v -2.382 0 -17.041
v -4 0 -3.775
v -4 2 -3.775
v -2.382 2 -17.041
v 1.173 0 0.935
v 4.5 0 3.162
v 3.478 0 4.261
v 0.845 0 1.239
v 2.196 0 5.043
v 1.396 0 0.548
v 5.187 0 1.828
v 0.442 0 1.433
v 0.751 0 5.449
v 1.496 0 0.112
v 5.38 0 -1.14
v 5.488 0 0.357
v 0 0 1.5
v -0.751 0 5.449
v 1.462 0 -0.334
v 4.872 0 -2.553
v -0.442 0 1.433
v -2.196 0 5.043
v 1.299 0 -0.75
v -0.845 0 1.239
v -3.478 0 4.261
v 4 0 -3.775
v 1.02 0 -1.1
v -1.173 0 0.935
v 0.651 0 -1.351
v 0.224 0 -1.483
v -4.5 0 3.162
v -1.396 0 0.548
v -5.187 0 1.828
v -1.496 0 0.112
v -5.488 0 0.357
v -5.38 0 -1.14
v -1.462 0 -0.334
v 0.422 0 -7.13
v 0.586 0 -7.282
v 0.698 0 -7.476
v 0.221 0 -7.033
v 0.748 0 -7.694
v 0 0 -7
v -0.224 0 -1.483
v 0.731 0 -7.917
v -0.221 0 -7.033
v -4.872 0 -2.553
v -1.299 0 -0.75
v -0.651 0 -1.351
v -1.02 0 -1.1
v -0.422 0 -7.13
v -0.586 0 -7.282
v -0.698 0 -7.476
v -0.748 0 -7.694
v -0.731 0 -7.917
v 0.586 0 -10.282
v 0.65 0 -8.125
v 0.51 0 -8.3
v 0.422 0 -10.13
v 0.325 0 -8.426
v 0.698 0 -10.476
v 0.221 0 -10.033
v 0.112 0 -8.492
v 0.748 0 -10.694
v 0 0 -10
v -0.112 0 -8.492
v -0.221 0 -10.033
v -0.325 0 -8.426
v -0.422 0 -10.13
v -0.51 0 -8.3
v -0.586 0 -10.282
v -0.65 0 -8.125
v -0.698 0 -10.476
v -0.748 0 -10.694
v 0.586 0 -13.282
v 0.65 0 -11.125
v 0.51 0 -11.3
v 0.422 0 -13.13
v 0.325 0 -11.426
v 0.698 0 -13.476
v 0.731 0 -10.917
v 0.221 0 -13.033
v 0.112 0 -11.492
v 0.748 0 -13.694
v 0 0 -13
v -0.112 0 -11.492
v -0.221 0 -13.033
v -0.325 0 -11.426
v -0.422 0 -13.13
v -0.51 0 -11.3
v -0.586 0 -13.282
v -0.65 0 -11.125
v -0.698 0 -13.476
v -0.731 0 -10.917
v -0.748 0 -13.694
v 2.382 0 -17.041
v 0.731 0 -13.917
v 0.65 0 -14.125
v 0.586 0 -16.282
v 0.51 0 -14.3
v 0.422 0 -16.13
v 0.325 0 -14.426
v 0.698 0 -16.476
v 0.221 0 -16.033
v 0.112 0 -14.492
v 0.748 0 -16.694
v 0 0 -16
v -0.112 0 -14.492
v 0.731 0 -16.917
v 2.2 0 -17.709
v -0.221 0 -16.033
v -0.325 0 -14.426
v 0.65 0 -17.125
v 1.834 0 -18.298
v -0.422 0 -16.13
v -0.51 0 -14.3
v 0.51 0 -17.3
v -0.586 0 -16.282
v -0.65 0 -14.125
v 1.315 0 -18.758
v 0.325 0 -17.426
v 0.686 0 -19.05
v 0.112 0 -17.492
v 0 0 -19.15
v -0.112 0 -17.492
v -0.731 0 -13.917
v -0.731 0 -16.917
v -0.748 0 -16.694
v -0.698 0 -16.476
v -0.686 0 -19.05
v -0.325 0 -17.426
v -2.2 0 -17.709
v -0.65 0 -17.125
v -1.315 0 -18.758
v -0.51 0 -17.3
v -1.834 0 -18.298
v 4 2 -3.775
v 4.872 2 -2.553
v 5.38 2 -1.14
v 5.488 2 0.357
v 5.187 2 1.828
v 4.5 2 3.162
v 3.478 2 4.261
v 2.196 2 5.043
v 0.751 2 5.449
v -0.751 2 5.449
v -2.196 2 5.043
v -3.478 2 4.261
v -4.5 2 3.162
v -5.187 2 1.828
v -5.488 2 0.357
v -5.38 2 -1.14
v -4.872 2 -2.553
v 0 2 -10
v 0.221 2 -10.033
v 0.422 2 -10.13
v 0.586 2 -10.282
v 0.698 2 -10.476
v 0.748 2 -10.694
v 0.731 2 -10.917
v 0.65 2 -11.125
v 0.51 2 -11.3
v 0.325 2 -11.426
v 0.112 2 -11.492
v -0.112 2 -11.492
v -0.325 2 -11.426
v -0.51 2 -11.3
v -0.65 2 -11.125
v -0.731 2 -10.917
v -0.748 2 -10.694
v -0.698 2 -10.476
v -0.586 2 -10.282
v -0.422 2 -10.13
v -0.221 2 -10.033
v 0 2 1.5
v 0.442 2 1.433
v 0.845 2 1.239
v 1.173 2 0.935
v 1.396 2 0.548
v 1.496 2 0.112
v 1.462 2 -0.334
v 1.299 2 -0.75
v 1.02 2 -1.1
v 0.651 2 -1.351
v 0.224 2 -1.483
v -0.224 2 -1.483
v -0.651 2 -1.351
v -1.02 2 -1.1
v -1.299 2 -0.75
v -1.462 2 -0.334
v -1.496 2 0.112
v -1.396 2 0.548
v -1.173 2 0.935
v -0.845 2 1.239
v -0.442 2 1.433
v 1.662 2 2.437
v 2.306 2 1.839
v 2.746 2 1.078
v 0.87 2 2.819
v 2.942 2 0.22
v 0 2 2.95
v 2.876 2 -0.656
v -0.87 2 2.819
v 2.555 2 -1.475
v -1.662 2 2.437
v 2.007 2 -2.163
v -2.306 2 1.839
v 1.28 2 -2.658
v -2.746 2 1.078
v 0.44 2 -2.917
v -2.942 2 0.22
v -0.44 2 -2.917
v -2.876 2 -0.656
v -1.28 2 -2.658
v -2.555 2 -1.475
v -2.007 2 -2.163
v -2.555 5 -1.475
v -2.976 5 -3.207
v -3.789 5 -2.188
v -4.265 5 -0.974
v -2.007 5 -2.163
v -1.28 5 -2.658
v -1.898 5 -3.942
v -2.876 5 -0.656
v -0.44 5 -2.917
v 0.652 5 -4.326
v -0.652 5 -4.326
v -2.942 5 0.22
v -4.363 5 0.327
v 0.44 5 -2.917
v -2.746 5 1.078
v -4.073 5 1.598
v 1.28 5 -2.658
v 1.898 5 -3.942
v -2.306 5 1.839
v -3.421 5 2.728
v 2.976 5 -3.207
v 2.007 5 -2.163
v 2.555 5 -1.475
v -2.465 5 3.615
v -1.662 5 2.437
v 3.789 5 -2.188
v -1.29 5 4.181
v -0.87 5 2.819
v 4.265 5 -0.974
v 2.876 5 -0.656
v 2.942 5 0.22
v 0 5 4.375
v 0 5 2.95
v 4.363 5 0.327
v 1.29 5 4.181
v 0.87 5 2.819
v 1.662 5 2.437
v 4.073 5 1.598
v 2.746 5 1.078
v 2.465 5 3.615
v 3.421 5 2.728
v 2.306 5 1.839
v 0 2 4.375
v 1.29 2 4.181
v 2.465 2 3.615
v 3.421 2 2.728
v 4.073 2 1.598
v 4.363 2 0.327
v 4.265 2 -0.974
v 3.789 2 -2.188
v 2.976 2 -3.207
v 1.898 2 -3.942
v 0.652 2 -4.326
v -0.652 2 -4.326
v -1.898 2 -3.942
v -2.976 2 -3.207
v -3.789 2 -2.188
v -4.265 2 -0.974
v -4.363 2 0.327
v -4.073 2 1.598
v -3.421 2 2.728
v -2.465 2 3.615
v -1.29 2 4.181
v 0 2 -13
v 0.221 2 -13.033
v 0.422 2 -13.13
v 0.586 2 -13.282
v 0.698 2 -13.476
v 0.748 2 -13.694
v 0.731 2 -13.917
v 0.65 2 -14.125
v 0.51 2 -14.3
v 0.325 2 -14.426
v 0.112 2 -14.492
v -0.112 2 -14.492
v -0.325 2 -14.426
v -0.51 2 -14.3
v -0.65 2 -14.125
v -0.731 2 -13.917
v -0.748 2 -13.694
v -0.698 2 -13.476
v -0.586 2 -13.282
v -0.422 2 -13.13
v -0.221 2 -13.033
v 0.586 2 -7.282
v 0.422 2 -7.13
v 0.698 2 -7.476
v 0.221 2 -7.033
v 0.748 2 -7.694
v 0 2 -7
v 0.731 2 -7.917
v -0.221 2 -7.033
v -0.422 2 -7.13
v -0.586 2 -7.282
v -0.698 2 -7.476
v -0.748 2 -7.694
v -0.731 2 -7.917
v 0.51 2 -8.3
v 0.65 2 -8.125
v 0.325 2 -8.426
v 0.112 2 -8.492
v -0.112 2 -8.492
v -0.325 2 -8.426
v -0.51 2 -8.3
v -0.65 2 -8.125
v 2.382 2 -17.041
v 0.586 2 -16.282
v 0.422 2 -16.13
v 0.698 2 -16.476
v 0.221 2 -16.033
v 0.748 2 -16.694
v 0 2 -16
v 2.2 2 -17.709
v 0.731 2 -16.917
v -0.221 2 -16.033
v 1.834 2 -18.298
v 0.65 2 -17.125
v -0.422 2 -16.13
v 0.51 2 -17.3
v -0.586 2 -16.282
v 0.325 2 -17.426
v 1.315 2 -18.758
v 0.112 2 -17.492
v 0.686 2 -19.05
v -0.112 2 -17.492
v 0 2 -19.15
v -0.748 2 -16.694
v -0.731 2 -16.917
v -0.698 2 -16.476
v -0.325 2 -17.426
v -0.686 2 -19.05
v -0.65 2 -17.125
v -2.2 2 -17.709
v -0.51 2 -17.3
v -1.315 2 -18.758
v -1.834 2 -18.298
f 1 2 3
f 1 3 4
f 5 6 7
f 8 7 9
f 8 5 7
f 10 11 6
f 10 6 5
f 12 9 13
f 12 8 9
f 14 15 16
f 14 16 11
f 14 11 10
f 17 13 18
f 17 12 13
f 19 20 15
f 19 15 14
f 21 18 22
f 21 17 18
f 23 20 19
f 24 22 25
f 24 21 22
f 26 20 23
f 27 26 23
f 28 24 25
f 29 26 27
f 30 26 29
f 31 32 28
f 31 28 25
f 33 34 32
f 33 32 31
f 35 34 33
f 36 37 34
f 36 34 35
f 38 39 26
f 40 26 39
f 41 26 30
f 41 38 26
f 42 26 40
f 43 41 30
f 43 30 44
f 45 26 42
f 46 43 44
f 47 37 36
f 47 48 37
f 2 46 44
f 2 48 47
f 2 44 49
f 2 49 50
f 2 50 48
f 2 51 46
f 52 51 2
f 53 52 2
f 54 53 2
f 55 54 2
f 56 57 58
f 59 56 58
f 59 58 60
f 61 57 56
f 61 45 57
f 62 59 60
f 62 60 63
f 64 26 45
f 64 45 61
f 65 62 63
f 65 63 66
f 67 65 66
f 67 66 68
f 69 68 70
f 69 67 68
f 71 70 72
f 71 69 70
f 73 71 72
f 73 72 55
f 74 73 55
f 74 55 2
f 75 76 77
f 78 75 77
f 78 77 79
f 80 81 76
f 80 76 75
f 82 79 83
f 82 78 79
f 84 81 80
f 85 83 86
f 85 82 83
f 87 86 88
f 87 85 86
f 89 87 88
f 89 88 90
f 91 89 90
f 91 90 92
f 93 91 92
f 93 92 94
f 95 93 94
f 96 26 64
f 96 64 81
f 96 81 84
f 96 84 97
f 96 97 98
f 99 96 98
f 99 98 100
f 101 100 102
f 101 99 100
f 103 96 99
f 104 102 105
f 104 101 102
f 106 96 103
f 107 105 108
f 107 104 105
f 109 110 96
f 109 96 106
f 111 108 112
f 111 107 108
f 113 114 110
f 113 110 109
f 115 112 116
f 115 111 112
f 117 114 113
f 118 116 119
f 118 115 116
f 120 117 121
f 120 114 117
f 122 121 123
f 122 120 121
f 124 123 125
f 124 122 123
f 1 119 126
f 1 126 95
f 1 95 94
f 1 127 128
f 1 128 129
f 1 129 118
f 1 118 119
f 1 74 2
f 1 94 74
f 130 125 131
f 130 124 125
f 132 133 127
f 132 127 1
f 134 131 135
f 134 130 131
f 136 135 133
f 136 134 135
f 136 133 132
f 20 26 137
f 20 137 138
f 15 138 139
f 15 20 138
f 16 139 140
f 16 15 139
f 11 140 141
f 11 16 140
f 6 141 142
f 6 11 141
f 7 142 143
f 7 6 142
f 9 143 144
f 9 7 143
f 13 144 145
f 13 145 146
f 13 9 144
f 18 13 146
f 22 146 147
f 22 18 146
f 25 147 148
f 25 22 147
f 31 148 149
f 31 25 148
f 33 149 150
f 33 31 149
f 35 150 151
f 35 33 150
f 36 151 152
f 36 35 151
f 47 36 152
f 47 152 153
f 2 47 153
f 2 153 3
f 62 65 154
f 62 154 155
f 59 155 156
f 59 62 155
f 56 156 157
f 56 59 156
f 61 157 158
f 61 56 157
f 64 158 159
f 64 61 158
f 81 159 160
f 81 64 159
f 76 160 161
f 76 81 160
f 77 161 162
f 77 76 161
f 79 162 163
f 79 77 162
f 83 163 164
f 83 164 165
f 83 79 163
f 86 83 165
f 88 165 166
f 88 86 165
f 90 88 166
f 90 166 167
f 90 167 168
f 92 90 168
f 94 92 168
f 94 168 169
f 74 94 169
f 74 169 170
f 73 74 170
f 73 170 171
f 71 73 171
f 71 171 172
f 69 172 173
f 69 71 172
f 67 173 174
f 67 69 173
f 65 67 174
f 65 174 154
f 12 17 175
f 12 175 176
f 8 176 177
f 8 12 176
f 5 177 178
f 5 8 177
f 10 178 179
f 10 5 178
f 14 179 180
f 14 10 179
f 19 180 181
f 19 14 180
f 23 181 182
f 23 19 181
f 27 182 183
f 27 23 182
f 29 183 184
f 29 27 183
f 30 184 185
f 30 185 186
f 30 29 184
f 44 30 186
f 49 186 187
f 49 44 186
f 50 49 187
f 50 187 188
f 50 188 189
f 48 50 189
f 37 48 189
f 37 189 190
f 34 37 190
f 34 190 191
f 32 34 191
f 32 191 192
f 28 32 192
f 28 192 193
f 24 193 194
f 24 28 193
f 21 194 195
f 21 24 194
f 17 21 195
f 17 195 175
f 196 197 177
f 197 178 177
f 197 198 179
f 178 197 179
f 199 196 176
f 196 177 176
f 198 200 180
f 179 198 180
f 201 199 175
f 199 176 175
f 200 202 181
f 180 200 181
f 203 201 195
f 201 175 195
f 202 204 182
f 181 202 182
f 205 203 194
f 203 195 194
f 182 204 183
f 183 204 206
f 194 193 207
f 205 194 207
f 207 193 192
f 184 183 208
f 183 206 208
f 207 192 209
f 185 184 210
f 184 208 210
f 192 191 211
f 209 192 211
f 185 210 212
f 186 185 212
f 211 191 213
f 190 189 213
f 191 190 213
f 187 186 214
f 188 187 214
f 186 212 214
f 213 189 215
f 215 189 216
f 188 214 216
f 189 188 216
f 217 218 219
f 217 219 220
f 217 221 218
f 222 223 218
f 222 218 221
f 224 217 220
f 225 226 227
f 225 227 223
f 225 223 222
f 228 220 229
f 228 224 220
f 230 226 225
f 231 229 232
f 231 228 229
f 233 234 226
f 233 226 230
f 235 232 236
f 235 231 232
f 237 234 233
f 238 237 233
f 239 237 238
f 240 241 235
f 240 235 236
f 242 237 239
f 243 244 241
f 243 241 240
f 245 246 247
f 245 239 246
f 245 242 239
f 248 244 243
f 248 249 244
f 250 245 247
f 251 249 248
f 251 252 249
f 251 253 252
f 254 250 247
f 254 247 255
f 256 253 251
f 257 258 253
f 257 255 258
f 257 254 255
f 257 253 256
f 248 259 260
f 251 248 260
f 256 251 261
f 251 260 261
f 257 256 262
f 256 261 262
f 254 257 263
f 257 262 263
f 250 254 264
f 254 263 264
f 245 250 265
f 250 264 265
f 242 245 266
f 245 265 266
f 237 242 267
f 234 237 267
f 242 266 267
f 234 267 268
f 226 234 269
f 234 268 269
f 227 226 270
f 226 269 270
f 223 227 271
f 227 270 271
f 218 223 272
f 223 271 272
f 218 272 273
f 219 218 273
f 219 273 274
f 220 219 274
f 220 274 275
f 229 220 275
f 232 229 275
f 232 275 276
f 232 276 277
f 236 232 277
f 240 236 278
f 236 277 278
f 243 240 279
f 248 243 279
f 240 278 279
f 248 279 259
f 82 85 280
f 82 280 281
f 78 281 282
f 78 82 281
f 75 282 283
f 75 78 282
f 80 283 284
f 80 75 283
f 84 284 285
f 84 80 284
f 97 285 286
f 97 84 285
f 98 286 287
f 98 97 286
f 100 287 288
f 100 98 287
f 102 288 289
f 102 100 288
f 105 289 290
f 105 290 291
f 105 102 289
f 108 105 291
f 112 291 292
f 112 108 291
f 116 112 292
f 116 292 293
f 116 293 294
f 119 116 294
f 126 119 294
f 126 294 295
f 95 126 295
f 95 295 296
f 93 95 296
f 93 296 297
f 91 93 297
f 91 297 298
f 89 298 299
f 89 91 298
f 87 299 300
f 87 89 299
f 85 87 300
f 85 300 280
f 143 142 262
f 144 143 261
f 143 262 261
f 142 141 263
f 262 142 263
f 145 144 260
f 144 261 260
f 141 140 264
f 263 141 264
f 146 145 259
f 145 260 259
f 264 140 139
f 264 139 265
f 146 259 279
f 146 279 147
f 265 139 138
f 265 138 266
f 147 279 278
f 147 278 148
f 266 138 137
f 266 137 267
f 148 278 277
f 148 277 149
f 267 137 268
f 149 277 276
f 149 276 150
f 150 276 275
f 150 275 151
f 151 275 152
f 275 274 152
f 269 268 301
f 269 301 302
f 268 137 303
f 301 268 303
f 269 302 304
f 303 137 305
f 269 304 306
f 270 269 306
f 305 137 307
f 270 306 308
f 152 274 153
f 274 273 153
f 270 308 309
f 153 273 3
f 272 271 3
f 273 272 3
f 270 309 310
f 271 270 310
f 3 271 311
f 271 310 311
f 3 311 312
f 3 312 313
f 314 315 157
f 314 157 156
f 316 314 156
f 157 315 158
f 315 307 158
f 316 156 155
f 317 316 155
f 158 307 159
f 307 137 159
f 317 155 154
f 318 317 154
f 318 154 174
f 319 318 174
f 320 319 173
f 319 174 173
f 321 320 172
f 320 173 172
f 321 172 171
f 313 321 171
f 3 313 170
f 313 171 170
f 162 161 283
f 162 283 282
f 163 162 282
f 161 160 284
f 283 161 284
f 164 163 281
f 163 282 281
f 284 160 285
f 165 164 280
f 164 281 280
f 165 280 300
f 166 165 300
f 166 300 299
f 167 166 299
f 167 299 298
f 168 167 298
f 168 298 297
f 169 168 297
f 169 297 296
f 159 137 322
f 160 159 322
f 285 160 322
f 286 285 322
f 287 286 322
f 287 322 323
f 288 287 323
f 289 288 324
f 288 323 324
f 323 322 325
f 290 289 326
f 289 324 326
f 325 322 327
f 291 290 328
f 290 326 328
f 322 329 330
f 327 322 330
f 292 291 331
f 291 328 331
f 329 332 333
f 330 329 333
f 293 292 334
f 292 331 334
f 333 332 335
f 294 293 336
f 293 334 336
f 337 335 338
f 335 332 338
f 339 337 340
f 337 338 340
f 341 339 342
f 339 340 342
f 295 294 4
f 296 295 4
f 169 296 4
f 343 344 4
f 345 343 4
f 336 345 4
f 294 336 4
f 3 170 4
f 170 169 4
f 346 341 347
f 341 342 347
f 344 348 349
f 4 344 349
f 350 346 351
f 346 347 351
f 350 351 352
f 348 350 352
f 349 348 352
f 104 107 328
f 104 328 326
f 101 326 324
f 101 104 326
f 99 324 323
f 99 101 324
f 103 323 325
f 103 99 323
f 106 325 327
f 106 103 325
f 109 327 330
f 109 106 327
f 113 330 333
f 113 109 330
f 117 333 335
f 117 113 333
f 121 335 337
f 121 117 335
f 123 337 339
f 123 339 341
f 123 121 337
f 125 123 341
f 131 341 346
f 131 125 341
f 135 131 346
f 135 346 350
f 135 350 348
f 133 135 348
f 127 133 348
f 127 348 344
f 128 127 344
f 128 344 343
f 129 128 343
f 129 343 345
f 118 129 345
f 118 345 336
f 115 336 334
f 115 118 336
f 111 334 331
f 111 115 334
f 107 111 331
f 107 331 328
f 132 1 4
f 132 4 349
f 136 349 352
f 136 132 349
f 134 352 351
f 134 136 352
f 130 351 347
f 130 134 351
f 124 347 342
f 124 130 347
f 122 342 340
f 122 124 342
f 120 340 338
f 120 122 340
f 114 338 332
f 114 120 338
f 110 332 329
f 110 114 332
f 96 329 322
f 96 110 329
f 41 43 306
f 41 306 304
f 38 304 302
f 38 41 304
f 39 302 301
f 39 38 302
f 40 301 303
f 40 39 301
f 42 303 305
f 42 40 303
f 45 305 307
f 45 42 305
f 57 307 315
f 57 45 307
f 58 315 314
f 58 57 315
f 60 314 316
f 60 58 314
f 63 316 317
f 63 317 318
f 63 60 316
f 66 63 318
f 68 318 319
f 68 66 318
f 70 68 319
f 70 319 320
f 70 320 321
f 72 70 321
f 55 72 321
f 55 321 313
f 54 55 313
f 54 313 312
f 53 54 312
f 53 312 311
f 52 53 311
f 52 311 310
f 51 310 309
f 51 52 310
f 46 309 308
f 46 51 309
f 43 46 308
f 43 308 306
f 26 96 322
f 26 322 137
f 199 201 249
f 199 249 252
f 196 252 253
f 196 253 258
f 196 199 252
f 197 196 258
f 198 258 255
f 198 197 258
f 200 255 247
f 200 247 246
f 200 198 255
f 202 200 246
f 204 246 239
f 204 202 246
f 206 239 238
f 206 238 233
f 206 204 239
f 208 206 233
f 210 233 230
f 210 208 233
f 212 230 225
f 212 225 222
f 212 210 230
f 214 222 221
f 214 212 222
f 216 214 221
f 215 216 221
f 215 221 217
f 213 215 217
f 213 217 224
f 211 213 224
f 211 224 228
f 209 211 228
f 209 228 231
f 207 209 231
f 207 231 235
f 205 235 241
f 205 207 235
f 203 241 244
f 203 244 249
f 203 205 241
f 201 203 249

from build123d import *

# Parameters (mm, degrees)
CROQUIS1_R              = 0.75
CROQUIS1_R_2            = 1.5
SALIENTE_EXTRUIR1_DEPTH = 2
CROQUIS2_R              = 4.375
CROQUIS2_R_2            = 2.95
SALIENTE_EXTRUIR2_DEPTH = 3


with BuildPart() as part:
    # Croquis1 → Saliente-Extruir1 (new body)
    with BuildSketch(Plane(origin=(0, 0, 0), x_dir=(1, 0, 0), z_dir=(0, 1, 0))):
        with BuildLine():
            Line((-4, 3.774917218), (-2.382352433, 17.040511421))
            ThreePointArc((-2.382352433, 17.040511421), (0, 19.15), (2.382352433, 17.040511421))
            Line((2.382352433, 17.040511421), (4, 3.774917218))
            ThreePointArc((4, 3.774917218), (0, -5.5), (-4, 3.774917218))
        make_face()
        with Locations(Location((0, 16.75, 0), (0, 0, 270))):
            Circle(CROQUIS1_R, mode=Mode.SUBTRACT)
        with Locations(Location((0, 13.75, 0), (0, 0, 270))):
            Circle(CROQUIS1_R, mode=Mode.SUBTRACT)
        with Locations(Location((0, 10.75, 0), (0, 0, 270))):
            Circle(CROQUIS1_R, mode=Mode.SUBTRACT)
        with Locations(Location((0, 7.75, 0), (0, 0, 270))):
            Circle(CROQUIS1_R, mode=Mode.SUBTRACT)
        with Locations(Location((0, 0, 0), (0, 0, 270))):
            Circle(CROQUIS1_R_2, mode=Mode.SUBTRACT)
    extrude(amount=SALIENTE_EXTRUIR1_DEPTH)

    # Croquis2 → Saliente-Extruir2 (add)
    with BuildSketch(Plane(origin=(0, 2, 0), x_dir=(1, 0, 0), z_dir=(0, 1, 0))):
        with Locations(Location((0, 0, 0), (0, 0, 270))):
            Circle(CROQUIS2_R)
        with Locations(Location((0, 0, 0), (0, 0, 270))):
            Circle(CROQUIS2_R_2, mode=Mode.SUBTRACT)
    extrude(amount=SALIENTE_EXTRUIR2_DEPTH)


solid = part.part
